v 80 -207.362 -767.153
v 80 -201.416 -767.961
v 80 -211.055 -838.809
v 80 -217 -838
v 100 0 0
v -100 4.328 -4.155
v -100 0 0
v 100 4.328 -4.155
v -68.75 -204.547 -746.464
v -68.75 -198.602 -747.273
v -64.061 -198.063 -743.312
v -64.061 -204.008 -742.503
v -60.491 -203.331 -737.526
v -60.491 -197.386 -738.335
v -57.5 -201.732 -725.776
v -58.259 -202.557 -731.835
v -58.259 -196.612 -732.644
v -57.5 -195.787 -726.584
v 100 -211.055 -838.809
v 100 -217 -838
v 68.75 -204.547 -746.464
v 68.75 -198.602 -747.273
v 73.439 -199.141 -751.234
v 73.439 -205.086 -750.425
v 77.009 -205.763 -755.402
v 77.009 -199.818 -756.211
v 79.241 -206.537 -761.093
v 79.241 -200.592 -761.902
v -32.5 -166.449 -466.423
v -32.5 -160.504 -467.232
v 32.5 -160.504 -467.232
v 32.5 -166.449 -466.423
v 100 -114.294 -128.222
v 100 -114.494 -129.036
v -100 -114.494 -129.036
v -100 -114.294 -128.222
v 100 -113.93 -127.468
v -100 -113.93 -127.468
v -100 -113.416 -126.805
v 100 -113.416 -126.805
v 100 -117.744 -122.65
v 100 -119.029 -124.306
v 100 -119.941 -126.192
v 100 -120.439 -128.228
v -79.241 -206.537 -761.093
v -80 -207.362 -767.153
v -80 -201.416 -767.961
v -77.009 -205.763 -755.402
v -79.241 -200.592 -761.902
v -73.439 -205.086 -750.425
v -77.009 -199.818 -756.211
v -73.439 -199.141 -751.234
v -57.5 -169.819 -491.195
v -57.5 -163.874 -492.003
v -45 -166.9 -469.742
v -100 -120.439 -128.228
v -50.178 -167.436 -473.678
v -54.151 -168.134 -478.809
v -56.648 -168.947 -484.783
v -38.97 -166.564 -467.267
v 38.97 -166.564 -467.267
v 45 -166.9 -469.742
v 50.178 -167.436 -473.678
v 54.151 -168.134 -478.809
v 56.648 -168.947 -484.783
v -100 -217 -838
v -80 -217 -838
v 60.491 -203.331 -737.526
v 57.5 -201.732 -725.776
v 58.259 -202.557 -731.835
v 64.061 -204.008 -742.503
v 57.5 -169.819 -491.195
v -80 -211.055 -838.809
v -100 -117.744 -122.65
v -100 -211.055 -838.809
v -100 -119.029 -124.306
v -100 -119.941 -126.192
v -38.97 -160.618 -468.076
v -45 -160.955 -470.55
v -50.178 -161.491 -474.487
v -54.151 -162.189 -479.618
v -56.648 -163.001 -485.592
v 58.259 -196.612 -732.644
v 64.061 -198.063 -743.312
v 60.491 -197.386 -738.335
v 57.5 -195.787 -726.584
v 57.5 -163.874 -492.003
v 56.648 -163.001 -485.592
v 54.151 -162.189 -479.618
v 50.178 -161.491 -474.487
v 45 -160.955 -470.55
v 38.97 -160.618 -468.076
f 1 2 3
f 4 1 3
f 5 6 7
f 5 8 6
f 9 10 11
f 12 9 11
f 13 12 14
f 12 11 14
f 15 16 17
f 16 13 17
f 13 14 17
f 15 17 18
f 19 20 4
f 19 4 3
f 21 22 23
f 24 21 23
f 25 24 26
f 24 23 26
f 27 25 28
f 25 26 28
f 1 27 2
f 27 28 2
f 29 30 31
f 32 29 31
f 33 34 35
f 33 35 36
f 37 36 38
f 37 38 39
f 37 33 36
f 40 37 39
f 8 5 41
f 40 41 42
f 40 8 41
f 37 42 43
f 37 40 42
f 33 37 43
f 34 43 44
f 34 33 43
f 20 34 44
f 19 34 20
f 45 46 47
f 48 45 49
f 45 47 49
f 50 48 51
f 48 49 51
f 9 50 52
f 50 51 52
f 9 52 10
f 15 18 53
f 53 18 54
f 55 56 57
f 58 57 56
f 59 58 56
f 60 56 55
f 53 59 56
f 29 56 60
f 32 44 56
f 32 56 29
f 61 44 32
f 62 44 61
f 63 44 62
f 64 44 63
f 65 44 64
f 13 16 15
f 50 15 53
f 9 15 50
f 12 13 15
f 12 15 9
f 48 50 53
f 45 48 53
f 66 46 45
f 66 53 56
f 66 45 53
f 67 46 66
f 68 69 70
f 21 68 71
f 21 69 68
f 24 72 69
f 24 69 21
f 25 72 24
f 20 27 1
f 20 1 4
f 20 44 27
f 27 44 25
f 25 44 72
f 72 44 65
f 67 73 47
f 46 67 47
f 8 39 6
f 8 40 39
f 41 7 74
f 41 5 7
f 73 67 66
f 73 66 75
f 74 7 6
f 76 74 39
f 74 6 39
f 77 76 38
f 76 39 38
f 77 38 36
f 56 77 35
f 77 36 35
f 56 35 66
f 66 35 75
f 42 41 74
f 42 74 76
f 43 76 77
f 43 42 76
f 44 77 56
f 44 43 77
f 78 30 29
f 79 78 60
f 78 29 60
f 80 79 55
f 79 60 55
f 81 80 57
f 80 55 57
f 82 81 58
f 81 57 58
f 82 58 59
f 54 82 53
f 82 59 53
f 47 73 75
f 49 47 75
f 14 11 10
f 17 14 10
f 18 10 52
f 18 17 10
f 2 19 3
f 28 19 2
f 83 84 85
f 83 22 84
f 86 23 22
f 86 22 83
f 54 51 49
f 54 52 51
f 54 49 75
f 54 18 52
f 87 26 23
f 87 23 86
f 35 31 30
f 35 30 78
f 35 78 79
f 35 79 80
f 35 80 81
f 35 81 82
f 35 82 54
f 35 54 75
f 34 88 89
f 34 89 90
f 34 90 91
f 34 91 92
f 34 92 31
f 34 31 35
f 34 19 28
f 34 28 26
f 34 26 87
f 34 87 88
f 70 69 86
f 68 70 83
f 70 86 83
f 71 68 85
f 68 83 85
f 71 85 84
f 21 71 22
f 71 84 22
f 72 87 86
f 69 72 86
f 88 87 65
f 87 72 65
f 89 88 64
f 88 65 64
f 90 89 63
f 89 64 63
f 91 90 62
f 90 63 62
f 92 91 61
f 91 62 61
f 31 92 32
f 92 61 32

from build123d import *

# Parameters (mm, degrees)
SM_BASE_FLANGE_1_DEPTH = 100
CUT_EXTRUDE_1_DEPTH    = 867.216543549
FILLET_1_R             = 25


# Sheet-metal steps are written as plain solids
with BuildPart() as part:
    # Sketch 1 → 基体-法兰1 (new, symmetric)
    with BuildSketch(Plane(origin=(0, 0, 0), x_dir=(0, 0, -1), z_dir=(1, 0, 0))):
        with BuildLine():
            Line((0, 0), (122.650248882, -117.744238927))
            ThreePointArc((122.650248882, -117.744238927), (125.224977196, -119.534385204), (128.227535984, -120.439089748))
            Line((128.227535984, -120.439089748), (838, -217))
            Line((838, -217), (838.808818708, -211.054765581))
            Line((838.808818708, -211.054765581), (129.036354692, -114.493855329))
            ThreePointArc((129.036354692, -114.493855329), (127.835331177, -114.131973511), (126.805439851, -113.415915001))
            Line((126.805439851, -113.415915001), (4.155190969, 4.328323926))
            Line((4.155190969, 4.328323926), (0, 0))
        make_face()
    extrude(amount=SM_BASE_FLANGE_1_DEPTH, both=True)

    # 草图4 → 切除-拉伸1 (cut, through all)
    with BuildSketch(Plane(origin=(0, -95.177553726, 12.94841895), x_dir=(1, 0, 0), z_dir=(0, 0.9908724031816991, -0.13480311796440184))):
        with BuildLine():
            Line((-80, 859.603350465), (-80, 788.103350465))
            ThreePointArc((-80, 788.103350465), (-77.008521077, 776.244809239), (-68.75, 767.224234104))
            ThreePointArc((-68.75, 767.224234104), (-60.491478923, 758.203658969), (-57.5, 746.345117743))
            Line((-57.5, 746.345117743), (-57.5, 484.603350465))
            Line((-57.5, 484.603350465), (57.5, 484.603350465))
            Line((57.5, 484.603350465), (57.5, 746.345117743))
            ThreePointArc((57.5, 746.345117743), (60.491478923, 758.203658969), (68.75, 767.224234104))
            ThreePointArc((68.75, 767.224234104), (77.008521077, 776.244809239), (80, 788.103350465))
            Line((80, 788.103350465), (80, 859.603350465))
            Line((80, 859.603350465), (-80, 859.603350465))
        make_face()
    extrude(amount=-CUT_EXTRUDE_1_DEPTH, mode=Mode.SUBTRACT)

    # 圆角1
    fillet_1_edges = [part.edges().sort_by_distance(p)[0] for p in [
        (57.5, -163.476213554, -466.827258161),
        (-57.5, -163.476213554, -466.827258161),
    ]]
    fillet(fillet_1_edges, radius=FILLET_1_R)


solid = part.part
